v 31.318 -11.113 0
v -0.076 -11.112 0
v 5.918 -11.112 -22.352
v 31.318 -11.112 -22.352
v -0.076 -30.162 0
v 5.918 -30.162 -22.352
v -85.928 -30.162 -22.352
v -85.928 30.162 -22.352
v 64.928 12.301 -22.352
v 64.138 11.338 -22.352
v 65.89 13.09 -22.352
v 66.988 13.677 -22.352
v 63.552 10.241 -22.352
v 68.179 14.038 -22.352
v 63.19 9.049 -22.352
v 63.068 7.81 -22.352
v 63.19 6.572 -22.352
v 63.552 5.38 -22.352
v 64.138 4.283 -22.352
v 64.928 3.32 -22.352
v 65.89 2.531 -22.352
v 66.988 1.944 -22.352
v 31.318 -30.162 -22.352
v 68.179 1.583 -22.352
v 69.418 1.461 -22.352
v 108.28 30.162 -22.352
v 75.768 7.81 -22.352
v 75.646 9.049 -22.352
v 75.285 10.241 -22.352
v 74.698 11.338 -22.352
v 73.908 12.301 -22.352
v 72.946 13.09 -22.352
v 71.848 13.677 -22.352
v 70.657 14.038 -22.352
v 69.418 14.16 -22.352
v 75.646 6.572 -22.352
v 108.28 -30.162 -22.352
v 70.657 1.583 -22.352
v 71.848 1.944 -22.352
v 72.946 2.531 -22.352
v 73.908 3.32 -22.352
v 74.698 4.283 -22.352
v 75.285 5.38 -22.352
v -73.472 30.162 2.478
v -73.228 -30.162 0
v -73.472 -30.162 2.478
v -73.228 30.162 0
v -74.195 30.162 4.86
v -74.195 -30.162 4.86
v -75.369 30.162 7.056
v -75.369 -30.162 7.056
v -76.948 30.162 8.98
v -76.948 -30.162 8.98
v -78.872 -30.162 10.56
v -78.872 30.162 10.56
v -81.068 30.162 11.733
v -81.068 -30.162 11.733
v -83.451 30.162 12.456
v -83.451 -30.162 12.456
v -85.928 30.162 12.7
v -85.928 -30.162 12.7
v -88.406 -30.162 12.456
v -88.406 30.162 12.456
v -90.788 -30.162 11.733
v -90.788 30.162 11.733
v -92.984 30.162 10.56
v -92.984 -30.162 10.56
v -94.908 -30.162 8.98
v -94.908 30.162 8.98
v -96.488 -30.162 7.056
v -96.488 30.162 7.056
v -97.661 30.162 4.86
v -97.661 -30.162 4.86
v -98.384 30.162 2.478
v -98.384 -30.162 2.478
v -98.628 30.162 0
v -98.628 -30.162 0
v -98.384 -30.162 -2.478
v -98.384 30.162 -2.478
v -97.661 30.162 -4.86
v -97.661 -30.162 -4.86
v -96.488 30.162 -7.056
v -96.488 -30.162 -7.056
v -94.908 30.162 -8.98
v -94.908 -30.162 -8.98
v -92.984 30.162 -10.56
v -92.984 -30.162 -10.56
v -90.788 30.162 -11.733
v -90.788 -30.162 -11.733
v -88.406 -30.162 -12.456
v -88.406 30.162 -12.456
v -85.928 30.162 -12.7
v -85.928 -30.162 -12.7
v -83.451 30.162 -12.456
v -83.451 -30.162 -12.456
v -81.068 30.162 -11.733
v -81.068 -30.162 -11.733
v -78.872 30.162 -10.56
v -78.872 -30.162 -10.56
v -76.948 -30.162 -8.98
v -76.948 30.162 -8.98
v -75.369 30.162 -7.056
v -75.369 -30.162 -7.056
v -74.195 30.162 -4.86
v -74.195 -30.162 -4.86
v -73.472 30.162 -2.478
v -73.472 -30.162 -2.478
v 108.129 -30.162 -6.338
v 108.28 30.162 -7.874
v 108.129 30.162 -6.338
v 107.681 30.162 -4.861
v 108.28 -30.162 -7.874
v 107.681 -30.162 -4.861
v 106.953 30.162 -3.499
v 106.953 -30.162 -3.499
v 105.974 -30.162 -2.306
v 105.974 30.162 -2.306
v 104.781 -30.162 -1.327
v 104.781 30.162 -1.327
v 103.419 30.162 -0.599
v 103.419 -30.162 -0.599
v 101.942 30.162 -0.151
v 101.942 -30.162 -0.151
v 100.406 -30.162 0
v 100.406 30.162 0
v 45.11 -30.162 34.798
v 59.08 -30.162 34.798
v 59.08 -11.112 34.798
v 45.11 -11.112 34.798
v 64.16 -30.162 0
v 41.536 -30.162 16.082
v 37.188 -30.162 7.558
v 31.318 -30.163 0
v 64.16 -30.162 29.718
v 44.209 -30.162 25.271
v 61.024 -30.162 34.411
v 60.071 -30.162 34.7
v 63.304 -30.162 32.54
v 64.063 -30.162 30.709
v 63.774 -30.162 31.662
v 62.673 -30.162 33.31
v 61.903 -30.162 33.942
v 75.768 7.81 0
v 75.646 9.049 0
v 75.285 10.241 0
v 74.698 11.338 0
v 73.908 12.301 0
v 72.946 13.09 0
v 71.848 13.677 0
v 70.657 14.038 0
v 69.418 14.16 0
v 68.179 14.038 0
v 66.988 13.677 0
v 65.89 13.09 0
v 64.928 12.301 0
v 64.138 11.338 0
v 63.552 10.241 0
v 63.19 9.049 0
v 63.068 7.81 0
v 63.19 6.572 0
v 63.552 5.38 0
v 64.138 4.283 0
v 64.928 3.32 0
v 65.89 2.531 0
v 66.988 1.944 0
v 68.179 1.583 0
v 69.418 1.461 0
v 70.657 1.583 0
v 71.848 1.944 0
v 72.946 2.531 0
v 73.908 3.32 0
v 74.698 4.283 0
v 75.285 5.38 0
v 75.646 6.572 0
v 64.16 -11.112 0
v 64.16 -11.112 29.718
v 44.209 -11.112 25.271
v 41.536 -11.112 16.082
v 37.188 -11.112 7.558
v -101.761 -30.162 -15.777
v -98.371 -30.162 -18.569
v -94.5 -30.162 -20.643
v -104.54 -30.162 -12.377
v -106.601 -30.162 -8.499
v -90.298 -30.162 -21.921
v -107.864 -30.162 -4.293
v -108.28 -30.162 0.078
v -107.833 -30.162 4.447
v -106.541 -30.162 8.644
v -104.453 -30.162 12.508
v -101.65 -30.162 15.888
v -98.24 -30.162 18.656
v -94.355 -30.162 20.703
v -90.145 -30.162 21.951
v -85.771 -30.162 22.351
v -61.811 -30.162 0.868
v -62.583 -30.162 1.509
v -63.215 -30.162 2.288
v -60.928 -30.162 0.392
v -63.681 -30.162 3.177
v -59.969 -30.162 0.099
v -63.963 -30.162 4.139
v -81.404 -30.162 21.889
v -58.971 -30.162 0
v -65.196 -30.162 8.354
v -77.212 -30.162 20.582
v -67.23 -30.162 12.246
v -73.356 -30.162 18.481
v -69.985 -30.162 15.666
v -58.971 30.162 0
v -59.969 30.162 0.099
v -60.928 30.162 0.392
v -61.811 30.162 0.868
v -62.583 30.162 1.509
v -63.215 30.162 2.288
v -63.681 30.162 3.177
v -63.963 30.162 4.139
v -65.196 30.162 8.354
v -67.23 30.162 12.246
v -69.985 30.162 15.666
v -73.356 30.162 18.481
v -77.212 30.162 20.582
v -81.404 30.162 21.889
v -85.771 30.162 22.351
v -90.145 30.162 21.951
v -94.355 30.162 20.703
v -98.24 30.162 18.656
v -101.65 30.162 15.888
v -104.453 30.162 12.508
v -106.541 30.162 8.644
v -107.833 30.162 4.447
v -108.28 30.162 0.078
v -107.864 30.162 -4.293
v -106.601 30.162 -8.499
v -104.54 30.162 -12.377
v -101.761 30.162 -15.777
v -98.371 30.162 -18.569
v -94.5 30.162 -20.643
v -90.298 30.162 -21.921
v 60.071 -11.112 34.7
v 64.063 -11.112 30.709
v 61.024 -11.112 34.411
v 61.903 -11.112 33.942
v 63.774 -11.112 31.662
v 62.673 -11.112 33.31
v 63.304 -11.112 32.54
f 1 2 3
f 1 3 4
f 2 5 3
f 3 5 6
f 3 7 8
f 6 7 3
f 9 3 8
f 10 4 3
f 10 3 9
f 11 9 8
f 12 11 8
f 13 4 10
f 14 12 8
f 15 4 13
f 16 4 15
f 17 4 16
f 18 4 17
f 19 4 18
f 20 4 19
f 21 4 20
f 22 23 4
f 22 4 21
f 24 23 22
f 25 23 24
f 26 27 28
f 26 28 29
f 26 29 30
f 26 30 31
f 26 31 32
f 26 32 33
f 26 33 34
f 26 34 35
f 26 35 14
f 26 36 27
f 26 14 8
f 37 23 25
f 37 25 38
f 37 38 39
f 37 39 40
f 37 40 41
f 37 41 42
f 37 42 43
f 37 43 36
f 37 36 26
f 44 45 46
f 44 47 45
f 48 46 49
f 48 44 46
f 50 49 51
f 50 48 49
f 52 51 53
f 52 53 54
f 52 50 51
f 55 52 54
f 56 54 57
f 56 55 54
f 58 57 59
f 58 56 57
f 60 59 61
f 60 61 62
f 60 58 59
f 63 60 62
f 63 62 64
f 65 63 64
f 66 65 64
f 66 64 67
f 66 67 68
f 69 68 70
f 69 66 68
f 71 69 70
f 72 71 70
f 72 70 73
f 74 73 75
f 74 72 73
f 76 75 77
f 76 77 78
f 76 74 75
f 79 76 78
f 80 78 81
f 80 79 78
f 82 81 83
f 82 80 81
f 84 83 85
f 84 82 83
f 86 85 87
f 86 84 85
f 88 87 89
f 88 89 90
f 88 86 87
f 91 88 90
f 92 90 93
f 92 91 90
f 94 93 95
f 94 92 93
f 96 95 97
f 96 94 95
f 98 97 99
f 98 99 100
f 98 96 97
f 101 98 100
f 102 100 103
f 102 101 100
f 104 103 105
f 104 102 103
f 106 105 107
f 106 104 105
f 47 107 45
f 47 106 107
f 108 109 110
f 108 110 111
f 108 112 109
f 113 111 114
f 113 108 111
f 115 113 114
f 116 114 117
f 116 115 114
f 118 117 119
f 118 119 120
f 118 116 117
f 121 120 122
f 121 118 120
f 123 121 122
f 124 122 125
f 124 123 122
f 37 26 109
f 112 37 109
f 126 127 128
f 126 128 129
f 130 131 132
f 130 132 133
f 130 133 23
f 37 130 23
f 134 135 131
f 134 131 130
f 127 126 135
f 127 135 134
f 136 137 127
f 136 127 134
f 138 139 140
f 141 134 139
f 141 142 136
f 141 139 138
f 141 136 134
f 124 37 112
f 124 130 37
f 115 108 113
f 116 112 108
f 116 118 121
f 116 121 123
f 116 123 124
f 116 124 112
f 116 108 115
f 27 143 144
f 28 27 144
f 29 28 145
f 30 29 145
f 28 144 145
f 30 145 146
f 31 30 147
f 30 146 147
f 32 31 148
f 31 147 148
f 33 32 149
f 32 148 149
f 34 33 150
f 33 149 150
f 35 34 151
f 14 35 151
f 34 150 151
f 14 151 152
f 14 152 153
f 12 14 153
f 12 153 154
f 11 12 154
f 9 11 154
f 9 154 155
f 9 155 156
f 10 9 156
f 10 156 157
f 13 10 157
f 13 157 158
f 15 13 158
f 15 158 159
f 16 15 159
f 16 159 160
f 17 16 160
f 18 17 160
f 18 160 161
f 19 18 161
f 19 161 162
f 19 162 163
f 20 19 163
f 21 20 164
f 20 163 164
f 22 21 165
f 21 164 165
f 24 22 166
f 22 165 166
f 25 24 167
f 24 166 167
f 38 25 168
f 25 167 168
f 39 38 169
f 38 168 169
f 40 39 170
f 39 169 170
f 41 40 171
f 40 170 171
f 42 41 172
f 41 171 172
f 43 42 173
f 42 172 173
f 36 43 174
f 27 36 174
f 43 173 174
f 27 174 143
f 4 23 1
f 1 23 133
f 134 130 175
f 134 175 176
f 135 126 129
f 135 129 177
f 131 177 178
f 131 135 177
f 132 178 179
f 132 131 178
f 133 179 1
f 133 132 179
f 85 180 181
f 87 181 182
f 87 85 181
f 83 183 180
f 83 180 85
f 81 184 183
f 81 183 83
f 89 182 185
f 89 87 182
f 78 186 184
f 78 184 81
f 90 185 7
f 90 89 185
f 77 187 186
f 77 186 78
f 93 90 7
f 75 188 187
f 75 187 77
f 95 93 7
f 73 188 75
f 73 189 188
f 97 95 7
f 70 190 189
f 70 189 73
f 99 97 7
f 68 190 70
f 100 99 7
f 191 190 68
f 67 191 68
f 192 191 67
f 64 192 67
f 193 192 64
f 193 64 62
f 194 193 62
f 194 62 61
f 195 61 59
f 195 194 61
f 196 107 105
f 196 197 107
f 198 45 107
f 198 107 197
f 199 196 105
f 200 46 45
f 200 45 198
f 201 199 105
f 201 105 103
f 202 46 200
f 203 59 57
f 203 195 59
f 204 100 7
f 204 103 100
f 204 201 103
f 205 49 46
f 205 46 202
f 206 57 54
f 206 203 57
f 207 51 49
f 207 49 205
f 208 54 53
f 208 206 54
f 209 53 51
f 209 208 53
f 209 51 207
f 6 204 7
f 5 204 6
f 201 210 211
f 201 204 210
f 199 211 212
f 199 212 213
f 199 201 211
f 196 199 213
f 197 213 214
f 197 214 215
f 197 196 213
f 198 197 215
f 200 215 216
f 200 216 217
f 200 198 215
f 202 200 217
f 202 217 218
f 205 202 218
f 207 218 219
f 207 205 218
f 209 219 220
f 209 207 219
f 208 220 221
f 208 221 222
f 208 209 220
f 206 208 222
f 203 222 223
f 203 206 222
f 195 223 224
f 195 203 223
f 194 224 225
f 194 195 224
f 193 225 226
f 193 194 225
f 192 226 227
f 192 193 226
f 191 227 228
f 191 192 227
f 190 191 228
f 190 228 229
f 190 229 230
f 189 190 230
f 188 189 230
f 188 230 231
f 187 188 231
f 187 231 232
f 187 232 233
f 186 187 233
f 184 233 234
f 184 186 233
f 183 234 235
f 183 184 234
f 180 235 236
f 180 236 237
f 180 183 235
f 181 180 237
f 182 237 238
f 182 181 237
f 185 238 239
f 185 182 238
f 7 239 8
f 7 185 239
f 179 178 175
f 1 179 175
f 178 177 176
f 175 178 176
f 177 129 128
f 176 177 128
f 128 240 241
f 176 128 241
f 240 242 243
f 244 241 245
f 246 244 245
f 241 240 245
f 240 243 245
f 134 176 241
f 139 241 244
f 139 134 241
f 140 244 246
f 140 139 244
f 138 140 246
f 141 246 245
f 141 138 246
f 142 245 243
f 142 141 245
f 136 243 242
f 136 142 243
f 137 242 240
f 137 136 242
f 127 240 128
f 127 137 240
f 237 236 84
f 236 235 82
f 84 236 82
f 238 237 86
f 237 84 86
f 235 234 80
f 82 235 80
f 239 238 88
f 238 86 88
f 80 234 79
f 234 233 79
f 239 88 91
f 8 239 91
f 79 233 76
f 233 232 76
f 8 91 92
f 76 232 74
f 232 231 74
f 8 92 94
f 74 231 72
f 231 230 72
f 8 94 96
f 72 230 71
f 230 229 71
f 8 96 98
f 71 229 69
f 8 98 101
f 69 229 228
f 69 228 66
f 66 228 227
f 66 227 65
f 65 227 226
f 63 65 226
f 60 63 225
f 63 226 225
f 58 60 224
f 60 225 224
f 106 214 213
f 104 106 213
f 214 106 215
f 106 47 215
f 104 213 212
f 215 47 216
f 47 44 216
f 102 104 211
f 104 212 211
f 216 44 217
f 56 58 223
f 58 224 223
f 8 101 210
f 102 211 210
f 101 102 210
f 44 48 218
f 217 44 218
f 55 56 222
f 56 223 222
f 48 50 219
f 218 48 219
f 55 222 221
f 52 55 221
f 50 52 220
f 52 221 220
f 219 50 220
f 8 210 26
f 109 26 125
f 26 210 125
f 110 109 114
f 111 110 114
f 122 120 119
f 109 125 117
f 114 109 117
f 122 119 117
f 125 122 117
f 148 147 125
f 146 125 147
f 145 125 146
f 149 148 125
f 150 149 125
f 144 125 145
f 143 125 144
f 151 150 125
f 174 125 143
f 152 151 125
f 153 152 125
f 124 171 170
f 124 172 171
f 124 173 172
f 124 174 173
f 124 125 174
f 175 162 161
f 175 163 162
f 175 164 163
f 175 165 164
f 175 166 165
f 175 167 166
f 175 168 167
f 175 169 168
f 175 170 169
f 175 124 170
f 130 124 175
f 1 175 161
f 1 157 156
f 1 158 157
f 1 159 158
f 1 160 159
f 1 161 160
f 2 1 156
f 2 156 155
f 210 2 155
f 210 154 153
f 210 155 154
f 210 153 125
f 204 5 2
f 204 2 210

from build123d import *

# Parameters (mm, degrees)
F0_R     = 12.7
F1_DEPTH = 30.1625
F3_DEPTH = 19.05
F5_DEPTH = 19.05
F6_R     = 6.35
F7_DEPTH = 22.353
F8_R     = 5.08


with BuildPart() as f1:
    # F0 (on Front) → F1 (new body, symmetric)
    with BuildSketch(Plane.XZ):
        with BuildLine():
            Line((100.4062, 0), (-63.5762, 0))
            ThreePointArc((-63.5762, 0), (-101.733451, 15.805251), (-85.9282, -22.352))
            Line((-85.9282, -22.352), (108.2802, -22.352))
            Line((108.2802, -22.352), (108.2802, -7.874))
            ThreePointArc((108.2802, -7.874), (105.973959, -2.306241), (100.4062, 0))
        make_face()
        with Locations((-85.9282, 0)):
            Circle(F0_R, mode=Mode.SUBTRACT)
    extrude(amount=F1_DEPTH, both=True)

    # F2 (on face) → F3 (cut)
    with BuildSketch(Plane.XZ.offset(30.1625)):
        Polygon((31.3182, 0), (-0.0762, 0), (5.9182, -22.352), (31.3182, -22.352), align=None)
    extrude(amount=-F3_DEPTH, mode=Mode.SUBTRACT)

    # F4 (on face) → F5 (join)
    with BuildSketch(Plane.XZ.offset(30.1625)):
        with BuildLine():
            ThreePointArc((64.1604, 29.718), (62.672502, 33.310102), (59.0804, 34.798))
            Line((59.0804, 34.798), (45.1104, 34.798))
            ThreePointArc((45.1104, 34.798), (41.536215, 16.082358), (31.3182, 0))
            Line((31.3182, 0), (64.1604, 0))
            Line((64.1604, 0), (64.1604, 29.718))
        make_face()
    extrude(amount=-F5_DEPTH)

    # F6 (on face) → F7 (cut, through all)
    with BuildSketch(Plane.XY):
        with Locations((69.4182, 7.8105)):
            Circle(F6_R)
    extrude(amount=-F7_DEPTH, mode=Mode.SUBTRACT)

    # F8
    f8_edges = [f1.edges().sort_by_distance(p)[0] for p in [
        (-63.5762, 0, 0),
    ]]
    fillet(f8_edges, radius=F8_R)


solid = f1.part
